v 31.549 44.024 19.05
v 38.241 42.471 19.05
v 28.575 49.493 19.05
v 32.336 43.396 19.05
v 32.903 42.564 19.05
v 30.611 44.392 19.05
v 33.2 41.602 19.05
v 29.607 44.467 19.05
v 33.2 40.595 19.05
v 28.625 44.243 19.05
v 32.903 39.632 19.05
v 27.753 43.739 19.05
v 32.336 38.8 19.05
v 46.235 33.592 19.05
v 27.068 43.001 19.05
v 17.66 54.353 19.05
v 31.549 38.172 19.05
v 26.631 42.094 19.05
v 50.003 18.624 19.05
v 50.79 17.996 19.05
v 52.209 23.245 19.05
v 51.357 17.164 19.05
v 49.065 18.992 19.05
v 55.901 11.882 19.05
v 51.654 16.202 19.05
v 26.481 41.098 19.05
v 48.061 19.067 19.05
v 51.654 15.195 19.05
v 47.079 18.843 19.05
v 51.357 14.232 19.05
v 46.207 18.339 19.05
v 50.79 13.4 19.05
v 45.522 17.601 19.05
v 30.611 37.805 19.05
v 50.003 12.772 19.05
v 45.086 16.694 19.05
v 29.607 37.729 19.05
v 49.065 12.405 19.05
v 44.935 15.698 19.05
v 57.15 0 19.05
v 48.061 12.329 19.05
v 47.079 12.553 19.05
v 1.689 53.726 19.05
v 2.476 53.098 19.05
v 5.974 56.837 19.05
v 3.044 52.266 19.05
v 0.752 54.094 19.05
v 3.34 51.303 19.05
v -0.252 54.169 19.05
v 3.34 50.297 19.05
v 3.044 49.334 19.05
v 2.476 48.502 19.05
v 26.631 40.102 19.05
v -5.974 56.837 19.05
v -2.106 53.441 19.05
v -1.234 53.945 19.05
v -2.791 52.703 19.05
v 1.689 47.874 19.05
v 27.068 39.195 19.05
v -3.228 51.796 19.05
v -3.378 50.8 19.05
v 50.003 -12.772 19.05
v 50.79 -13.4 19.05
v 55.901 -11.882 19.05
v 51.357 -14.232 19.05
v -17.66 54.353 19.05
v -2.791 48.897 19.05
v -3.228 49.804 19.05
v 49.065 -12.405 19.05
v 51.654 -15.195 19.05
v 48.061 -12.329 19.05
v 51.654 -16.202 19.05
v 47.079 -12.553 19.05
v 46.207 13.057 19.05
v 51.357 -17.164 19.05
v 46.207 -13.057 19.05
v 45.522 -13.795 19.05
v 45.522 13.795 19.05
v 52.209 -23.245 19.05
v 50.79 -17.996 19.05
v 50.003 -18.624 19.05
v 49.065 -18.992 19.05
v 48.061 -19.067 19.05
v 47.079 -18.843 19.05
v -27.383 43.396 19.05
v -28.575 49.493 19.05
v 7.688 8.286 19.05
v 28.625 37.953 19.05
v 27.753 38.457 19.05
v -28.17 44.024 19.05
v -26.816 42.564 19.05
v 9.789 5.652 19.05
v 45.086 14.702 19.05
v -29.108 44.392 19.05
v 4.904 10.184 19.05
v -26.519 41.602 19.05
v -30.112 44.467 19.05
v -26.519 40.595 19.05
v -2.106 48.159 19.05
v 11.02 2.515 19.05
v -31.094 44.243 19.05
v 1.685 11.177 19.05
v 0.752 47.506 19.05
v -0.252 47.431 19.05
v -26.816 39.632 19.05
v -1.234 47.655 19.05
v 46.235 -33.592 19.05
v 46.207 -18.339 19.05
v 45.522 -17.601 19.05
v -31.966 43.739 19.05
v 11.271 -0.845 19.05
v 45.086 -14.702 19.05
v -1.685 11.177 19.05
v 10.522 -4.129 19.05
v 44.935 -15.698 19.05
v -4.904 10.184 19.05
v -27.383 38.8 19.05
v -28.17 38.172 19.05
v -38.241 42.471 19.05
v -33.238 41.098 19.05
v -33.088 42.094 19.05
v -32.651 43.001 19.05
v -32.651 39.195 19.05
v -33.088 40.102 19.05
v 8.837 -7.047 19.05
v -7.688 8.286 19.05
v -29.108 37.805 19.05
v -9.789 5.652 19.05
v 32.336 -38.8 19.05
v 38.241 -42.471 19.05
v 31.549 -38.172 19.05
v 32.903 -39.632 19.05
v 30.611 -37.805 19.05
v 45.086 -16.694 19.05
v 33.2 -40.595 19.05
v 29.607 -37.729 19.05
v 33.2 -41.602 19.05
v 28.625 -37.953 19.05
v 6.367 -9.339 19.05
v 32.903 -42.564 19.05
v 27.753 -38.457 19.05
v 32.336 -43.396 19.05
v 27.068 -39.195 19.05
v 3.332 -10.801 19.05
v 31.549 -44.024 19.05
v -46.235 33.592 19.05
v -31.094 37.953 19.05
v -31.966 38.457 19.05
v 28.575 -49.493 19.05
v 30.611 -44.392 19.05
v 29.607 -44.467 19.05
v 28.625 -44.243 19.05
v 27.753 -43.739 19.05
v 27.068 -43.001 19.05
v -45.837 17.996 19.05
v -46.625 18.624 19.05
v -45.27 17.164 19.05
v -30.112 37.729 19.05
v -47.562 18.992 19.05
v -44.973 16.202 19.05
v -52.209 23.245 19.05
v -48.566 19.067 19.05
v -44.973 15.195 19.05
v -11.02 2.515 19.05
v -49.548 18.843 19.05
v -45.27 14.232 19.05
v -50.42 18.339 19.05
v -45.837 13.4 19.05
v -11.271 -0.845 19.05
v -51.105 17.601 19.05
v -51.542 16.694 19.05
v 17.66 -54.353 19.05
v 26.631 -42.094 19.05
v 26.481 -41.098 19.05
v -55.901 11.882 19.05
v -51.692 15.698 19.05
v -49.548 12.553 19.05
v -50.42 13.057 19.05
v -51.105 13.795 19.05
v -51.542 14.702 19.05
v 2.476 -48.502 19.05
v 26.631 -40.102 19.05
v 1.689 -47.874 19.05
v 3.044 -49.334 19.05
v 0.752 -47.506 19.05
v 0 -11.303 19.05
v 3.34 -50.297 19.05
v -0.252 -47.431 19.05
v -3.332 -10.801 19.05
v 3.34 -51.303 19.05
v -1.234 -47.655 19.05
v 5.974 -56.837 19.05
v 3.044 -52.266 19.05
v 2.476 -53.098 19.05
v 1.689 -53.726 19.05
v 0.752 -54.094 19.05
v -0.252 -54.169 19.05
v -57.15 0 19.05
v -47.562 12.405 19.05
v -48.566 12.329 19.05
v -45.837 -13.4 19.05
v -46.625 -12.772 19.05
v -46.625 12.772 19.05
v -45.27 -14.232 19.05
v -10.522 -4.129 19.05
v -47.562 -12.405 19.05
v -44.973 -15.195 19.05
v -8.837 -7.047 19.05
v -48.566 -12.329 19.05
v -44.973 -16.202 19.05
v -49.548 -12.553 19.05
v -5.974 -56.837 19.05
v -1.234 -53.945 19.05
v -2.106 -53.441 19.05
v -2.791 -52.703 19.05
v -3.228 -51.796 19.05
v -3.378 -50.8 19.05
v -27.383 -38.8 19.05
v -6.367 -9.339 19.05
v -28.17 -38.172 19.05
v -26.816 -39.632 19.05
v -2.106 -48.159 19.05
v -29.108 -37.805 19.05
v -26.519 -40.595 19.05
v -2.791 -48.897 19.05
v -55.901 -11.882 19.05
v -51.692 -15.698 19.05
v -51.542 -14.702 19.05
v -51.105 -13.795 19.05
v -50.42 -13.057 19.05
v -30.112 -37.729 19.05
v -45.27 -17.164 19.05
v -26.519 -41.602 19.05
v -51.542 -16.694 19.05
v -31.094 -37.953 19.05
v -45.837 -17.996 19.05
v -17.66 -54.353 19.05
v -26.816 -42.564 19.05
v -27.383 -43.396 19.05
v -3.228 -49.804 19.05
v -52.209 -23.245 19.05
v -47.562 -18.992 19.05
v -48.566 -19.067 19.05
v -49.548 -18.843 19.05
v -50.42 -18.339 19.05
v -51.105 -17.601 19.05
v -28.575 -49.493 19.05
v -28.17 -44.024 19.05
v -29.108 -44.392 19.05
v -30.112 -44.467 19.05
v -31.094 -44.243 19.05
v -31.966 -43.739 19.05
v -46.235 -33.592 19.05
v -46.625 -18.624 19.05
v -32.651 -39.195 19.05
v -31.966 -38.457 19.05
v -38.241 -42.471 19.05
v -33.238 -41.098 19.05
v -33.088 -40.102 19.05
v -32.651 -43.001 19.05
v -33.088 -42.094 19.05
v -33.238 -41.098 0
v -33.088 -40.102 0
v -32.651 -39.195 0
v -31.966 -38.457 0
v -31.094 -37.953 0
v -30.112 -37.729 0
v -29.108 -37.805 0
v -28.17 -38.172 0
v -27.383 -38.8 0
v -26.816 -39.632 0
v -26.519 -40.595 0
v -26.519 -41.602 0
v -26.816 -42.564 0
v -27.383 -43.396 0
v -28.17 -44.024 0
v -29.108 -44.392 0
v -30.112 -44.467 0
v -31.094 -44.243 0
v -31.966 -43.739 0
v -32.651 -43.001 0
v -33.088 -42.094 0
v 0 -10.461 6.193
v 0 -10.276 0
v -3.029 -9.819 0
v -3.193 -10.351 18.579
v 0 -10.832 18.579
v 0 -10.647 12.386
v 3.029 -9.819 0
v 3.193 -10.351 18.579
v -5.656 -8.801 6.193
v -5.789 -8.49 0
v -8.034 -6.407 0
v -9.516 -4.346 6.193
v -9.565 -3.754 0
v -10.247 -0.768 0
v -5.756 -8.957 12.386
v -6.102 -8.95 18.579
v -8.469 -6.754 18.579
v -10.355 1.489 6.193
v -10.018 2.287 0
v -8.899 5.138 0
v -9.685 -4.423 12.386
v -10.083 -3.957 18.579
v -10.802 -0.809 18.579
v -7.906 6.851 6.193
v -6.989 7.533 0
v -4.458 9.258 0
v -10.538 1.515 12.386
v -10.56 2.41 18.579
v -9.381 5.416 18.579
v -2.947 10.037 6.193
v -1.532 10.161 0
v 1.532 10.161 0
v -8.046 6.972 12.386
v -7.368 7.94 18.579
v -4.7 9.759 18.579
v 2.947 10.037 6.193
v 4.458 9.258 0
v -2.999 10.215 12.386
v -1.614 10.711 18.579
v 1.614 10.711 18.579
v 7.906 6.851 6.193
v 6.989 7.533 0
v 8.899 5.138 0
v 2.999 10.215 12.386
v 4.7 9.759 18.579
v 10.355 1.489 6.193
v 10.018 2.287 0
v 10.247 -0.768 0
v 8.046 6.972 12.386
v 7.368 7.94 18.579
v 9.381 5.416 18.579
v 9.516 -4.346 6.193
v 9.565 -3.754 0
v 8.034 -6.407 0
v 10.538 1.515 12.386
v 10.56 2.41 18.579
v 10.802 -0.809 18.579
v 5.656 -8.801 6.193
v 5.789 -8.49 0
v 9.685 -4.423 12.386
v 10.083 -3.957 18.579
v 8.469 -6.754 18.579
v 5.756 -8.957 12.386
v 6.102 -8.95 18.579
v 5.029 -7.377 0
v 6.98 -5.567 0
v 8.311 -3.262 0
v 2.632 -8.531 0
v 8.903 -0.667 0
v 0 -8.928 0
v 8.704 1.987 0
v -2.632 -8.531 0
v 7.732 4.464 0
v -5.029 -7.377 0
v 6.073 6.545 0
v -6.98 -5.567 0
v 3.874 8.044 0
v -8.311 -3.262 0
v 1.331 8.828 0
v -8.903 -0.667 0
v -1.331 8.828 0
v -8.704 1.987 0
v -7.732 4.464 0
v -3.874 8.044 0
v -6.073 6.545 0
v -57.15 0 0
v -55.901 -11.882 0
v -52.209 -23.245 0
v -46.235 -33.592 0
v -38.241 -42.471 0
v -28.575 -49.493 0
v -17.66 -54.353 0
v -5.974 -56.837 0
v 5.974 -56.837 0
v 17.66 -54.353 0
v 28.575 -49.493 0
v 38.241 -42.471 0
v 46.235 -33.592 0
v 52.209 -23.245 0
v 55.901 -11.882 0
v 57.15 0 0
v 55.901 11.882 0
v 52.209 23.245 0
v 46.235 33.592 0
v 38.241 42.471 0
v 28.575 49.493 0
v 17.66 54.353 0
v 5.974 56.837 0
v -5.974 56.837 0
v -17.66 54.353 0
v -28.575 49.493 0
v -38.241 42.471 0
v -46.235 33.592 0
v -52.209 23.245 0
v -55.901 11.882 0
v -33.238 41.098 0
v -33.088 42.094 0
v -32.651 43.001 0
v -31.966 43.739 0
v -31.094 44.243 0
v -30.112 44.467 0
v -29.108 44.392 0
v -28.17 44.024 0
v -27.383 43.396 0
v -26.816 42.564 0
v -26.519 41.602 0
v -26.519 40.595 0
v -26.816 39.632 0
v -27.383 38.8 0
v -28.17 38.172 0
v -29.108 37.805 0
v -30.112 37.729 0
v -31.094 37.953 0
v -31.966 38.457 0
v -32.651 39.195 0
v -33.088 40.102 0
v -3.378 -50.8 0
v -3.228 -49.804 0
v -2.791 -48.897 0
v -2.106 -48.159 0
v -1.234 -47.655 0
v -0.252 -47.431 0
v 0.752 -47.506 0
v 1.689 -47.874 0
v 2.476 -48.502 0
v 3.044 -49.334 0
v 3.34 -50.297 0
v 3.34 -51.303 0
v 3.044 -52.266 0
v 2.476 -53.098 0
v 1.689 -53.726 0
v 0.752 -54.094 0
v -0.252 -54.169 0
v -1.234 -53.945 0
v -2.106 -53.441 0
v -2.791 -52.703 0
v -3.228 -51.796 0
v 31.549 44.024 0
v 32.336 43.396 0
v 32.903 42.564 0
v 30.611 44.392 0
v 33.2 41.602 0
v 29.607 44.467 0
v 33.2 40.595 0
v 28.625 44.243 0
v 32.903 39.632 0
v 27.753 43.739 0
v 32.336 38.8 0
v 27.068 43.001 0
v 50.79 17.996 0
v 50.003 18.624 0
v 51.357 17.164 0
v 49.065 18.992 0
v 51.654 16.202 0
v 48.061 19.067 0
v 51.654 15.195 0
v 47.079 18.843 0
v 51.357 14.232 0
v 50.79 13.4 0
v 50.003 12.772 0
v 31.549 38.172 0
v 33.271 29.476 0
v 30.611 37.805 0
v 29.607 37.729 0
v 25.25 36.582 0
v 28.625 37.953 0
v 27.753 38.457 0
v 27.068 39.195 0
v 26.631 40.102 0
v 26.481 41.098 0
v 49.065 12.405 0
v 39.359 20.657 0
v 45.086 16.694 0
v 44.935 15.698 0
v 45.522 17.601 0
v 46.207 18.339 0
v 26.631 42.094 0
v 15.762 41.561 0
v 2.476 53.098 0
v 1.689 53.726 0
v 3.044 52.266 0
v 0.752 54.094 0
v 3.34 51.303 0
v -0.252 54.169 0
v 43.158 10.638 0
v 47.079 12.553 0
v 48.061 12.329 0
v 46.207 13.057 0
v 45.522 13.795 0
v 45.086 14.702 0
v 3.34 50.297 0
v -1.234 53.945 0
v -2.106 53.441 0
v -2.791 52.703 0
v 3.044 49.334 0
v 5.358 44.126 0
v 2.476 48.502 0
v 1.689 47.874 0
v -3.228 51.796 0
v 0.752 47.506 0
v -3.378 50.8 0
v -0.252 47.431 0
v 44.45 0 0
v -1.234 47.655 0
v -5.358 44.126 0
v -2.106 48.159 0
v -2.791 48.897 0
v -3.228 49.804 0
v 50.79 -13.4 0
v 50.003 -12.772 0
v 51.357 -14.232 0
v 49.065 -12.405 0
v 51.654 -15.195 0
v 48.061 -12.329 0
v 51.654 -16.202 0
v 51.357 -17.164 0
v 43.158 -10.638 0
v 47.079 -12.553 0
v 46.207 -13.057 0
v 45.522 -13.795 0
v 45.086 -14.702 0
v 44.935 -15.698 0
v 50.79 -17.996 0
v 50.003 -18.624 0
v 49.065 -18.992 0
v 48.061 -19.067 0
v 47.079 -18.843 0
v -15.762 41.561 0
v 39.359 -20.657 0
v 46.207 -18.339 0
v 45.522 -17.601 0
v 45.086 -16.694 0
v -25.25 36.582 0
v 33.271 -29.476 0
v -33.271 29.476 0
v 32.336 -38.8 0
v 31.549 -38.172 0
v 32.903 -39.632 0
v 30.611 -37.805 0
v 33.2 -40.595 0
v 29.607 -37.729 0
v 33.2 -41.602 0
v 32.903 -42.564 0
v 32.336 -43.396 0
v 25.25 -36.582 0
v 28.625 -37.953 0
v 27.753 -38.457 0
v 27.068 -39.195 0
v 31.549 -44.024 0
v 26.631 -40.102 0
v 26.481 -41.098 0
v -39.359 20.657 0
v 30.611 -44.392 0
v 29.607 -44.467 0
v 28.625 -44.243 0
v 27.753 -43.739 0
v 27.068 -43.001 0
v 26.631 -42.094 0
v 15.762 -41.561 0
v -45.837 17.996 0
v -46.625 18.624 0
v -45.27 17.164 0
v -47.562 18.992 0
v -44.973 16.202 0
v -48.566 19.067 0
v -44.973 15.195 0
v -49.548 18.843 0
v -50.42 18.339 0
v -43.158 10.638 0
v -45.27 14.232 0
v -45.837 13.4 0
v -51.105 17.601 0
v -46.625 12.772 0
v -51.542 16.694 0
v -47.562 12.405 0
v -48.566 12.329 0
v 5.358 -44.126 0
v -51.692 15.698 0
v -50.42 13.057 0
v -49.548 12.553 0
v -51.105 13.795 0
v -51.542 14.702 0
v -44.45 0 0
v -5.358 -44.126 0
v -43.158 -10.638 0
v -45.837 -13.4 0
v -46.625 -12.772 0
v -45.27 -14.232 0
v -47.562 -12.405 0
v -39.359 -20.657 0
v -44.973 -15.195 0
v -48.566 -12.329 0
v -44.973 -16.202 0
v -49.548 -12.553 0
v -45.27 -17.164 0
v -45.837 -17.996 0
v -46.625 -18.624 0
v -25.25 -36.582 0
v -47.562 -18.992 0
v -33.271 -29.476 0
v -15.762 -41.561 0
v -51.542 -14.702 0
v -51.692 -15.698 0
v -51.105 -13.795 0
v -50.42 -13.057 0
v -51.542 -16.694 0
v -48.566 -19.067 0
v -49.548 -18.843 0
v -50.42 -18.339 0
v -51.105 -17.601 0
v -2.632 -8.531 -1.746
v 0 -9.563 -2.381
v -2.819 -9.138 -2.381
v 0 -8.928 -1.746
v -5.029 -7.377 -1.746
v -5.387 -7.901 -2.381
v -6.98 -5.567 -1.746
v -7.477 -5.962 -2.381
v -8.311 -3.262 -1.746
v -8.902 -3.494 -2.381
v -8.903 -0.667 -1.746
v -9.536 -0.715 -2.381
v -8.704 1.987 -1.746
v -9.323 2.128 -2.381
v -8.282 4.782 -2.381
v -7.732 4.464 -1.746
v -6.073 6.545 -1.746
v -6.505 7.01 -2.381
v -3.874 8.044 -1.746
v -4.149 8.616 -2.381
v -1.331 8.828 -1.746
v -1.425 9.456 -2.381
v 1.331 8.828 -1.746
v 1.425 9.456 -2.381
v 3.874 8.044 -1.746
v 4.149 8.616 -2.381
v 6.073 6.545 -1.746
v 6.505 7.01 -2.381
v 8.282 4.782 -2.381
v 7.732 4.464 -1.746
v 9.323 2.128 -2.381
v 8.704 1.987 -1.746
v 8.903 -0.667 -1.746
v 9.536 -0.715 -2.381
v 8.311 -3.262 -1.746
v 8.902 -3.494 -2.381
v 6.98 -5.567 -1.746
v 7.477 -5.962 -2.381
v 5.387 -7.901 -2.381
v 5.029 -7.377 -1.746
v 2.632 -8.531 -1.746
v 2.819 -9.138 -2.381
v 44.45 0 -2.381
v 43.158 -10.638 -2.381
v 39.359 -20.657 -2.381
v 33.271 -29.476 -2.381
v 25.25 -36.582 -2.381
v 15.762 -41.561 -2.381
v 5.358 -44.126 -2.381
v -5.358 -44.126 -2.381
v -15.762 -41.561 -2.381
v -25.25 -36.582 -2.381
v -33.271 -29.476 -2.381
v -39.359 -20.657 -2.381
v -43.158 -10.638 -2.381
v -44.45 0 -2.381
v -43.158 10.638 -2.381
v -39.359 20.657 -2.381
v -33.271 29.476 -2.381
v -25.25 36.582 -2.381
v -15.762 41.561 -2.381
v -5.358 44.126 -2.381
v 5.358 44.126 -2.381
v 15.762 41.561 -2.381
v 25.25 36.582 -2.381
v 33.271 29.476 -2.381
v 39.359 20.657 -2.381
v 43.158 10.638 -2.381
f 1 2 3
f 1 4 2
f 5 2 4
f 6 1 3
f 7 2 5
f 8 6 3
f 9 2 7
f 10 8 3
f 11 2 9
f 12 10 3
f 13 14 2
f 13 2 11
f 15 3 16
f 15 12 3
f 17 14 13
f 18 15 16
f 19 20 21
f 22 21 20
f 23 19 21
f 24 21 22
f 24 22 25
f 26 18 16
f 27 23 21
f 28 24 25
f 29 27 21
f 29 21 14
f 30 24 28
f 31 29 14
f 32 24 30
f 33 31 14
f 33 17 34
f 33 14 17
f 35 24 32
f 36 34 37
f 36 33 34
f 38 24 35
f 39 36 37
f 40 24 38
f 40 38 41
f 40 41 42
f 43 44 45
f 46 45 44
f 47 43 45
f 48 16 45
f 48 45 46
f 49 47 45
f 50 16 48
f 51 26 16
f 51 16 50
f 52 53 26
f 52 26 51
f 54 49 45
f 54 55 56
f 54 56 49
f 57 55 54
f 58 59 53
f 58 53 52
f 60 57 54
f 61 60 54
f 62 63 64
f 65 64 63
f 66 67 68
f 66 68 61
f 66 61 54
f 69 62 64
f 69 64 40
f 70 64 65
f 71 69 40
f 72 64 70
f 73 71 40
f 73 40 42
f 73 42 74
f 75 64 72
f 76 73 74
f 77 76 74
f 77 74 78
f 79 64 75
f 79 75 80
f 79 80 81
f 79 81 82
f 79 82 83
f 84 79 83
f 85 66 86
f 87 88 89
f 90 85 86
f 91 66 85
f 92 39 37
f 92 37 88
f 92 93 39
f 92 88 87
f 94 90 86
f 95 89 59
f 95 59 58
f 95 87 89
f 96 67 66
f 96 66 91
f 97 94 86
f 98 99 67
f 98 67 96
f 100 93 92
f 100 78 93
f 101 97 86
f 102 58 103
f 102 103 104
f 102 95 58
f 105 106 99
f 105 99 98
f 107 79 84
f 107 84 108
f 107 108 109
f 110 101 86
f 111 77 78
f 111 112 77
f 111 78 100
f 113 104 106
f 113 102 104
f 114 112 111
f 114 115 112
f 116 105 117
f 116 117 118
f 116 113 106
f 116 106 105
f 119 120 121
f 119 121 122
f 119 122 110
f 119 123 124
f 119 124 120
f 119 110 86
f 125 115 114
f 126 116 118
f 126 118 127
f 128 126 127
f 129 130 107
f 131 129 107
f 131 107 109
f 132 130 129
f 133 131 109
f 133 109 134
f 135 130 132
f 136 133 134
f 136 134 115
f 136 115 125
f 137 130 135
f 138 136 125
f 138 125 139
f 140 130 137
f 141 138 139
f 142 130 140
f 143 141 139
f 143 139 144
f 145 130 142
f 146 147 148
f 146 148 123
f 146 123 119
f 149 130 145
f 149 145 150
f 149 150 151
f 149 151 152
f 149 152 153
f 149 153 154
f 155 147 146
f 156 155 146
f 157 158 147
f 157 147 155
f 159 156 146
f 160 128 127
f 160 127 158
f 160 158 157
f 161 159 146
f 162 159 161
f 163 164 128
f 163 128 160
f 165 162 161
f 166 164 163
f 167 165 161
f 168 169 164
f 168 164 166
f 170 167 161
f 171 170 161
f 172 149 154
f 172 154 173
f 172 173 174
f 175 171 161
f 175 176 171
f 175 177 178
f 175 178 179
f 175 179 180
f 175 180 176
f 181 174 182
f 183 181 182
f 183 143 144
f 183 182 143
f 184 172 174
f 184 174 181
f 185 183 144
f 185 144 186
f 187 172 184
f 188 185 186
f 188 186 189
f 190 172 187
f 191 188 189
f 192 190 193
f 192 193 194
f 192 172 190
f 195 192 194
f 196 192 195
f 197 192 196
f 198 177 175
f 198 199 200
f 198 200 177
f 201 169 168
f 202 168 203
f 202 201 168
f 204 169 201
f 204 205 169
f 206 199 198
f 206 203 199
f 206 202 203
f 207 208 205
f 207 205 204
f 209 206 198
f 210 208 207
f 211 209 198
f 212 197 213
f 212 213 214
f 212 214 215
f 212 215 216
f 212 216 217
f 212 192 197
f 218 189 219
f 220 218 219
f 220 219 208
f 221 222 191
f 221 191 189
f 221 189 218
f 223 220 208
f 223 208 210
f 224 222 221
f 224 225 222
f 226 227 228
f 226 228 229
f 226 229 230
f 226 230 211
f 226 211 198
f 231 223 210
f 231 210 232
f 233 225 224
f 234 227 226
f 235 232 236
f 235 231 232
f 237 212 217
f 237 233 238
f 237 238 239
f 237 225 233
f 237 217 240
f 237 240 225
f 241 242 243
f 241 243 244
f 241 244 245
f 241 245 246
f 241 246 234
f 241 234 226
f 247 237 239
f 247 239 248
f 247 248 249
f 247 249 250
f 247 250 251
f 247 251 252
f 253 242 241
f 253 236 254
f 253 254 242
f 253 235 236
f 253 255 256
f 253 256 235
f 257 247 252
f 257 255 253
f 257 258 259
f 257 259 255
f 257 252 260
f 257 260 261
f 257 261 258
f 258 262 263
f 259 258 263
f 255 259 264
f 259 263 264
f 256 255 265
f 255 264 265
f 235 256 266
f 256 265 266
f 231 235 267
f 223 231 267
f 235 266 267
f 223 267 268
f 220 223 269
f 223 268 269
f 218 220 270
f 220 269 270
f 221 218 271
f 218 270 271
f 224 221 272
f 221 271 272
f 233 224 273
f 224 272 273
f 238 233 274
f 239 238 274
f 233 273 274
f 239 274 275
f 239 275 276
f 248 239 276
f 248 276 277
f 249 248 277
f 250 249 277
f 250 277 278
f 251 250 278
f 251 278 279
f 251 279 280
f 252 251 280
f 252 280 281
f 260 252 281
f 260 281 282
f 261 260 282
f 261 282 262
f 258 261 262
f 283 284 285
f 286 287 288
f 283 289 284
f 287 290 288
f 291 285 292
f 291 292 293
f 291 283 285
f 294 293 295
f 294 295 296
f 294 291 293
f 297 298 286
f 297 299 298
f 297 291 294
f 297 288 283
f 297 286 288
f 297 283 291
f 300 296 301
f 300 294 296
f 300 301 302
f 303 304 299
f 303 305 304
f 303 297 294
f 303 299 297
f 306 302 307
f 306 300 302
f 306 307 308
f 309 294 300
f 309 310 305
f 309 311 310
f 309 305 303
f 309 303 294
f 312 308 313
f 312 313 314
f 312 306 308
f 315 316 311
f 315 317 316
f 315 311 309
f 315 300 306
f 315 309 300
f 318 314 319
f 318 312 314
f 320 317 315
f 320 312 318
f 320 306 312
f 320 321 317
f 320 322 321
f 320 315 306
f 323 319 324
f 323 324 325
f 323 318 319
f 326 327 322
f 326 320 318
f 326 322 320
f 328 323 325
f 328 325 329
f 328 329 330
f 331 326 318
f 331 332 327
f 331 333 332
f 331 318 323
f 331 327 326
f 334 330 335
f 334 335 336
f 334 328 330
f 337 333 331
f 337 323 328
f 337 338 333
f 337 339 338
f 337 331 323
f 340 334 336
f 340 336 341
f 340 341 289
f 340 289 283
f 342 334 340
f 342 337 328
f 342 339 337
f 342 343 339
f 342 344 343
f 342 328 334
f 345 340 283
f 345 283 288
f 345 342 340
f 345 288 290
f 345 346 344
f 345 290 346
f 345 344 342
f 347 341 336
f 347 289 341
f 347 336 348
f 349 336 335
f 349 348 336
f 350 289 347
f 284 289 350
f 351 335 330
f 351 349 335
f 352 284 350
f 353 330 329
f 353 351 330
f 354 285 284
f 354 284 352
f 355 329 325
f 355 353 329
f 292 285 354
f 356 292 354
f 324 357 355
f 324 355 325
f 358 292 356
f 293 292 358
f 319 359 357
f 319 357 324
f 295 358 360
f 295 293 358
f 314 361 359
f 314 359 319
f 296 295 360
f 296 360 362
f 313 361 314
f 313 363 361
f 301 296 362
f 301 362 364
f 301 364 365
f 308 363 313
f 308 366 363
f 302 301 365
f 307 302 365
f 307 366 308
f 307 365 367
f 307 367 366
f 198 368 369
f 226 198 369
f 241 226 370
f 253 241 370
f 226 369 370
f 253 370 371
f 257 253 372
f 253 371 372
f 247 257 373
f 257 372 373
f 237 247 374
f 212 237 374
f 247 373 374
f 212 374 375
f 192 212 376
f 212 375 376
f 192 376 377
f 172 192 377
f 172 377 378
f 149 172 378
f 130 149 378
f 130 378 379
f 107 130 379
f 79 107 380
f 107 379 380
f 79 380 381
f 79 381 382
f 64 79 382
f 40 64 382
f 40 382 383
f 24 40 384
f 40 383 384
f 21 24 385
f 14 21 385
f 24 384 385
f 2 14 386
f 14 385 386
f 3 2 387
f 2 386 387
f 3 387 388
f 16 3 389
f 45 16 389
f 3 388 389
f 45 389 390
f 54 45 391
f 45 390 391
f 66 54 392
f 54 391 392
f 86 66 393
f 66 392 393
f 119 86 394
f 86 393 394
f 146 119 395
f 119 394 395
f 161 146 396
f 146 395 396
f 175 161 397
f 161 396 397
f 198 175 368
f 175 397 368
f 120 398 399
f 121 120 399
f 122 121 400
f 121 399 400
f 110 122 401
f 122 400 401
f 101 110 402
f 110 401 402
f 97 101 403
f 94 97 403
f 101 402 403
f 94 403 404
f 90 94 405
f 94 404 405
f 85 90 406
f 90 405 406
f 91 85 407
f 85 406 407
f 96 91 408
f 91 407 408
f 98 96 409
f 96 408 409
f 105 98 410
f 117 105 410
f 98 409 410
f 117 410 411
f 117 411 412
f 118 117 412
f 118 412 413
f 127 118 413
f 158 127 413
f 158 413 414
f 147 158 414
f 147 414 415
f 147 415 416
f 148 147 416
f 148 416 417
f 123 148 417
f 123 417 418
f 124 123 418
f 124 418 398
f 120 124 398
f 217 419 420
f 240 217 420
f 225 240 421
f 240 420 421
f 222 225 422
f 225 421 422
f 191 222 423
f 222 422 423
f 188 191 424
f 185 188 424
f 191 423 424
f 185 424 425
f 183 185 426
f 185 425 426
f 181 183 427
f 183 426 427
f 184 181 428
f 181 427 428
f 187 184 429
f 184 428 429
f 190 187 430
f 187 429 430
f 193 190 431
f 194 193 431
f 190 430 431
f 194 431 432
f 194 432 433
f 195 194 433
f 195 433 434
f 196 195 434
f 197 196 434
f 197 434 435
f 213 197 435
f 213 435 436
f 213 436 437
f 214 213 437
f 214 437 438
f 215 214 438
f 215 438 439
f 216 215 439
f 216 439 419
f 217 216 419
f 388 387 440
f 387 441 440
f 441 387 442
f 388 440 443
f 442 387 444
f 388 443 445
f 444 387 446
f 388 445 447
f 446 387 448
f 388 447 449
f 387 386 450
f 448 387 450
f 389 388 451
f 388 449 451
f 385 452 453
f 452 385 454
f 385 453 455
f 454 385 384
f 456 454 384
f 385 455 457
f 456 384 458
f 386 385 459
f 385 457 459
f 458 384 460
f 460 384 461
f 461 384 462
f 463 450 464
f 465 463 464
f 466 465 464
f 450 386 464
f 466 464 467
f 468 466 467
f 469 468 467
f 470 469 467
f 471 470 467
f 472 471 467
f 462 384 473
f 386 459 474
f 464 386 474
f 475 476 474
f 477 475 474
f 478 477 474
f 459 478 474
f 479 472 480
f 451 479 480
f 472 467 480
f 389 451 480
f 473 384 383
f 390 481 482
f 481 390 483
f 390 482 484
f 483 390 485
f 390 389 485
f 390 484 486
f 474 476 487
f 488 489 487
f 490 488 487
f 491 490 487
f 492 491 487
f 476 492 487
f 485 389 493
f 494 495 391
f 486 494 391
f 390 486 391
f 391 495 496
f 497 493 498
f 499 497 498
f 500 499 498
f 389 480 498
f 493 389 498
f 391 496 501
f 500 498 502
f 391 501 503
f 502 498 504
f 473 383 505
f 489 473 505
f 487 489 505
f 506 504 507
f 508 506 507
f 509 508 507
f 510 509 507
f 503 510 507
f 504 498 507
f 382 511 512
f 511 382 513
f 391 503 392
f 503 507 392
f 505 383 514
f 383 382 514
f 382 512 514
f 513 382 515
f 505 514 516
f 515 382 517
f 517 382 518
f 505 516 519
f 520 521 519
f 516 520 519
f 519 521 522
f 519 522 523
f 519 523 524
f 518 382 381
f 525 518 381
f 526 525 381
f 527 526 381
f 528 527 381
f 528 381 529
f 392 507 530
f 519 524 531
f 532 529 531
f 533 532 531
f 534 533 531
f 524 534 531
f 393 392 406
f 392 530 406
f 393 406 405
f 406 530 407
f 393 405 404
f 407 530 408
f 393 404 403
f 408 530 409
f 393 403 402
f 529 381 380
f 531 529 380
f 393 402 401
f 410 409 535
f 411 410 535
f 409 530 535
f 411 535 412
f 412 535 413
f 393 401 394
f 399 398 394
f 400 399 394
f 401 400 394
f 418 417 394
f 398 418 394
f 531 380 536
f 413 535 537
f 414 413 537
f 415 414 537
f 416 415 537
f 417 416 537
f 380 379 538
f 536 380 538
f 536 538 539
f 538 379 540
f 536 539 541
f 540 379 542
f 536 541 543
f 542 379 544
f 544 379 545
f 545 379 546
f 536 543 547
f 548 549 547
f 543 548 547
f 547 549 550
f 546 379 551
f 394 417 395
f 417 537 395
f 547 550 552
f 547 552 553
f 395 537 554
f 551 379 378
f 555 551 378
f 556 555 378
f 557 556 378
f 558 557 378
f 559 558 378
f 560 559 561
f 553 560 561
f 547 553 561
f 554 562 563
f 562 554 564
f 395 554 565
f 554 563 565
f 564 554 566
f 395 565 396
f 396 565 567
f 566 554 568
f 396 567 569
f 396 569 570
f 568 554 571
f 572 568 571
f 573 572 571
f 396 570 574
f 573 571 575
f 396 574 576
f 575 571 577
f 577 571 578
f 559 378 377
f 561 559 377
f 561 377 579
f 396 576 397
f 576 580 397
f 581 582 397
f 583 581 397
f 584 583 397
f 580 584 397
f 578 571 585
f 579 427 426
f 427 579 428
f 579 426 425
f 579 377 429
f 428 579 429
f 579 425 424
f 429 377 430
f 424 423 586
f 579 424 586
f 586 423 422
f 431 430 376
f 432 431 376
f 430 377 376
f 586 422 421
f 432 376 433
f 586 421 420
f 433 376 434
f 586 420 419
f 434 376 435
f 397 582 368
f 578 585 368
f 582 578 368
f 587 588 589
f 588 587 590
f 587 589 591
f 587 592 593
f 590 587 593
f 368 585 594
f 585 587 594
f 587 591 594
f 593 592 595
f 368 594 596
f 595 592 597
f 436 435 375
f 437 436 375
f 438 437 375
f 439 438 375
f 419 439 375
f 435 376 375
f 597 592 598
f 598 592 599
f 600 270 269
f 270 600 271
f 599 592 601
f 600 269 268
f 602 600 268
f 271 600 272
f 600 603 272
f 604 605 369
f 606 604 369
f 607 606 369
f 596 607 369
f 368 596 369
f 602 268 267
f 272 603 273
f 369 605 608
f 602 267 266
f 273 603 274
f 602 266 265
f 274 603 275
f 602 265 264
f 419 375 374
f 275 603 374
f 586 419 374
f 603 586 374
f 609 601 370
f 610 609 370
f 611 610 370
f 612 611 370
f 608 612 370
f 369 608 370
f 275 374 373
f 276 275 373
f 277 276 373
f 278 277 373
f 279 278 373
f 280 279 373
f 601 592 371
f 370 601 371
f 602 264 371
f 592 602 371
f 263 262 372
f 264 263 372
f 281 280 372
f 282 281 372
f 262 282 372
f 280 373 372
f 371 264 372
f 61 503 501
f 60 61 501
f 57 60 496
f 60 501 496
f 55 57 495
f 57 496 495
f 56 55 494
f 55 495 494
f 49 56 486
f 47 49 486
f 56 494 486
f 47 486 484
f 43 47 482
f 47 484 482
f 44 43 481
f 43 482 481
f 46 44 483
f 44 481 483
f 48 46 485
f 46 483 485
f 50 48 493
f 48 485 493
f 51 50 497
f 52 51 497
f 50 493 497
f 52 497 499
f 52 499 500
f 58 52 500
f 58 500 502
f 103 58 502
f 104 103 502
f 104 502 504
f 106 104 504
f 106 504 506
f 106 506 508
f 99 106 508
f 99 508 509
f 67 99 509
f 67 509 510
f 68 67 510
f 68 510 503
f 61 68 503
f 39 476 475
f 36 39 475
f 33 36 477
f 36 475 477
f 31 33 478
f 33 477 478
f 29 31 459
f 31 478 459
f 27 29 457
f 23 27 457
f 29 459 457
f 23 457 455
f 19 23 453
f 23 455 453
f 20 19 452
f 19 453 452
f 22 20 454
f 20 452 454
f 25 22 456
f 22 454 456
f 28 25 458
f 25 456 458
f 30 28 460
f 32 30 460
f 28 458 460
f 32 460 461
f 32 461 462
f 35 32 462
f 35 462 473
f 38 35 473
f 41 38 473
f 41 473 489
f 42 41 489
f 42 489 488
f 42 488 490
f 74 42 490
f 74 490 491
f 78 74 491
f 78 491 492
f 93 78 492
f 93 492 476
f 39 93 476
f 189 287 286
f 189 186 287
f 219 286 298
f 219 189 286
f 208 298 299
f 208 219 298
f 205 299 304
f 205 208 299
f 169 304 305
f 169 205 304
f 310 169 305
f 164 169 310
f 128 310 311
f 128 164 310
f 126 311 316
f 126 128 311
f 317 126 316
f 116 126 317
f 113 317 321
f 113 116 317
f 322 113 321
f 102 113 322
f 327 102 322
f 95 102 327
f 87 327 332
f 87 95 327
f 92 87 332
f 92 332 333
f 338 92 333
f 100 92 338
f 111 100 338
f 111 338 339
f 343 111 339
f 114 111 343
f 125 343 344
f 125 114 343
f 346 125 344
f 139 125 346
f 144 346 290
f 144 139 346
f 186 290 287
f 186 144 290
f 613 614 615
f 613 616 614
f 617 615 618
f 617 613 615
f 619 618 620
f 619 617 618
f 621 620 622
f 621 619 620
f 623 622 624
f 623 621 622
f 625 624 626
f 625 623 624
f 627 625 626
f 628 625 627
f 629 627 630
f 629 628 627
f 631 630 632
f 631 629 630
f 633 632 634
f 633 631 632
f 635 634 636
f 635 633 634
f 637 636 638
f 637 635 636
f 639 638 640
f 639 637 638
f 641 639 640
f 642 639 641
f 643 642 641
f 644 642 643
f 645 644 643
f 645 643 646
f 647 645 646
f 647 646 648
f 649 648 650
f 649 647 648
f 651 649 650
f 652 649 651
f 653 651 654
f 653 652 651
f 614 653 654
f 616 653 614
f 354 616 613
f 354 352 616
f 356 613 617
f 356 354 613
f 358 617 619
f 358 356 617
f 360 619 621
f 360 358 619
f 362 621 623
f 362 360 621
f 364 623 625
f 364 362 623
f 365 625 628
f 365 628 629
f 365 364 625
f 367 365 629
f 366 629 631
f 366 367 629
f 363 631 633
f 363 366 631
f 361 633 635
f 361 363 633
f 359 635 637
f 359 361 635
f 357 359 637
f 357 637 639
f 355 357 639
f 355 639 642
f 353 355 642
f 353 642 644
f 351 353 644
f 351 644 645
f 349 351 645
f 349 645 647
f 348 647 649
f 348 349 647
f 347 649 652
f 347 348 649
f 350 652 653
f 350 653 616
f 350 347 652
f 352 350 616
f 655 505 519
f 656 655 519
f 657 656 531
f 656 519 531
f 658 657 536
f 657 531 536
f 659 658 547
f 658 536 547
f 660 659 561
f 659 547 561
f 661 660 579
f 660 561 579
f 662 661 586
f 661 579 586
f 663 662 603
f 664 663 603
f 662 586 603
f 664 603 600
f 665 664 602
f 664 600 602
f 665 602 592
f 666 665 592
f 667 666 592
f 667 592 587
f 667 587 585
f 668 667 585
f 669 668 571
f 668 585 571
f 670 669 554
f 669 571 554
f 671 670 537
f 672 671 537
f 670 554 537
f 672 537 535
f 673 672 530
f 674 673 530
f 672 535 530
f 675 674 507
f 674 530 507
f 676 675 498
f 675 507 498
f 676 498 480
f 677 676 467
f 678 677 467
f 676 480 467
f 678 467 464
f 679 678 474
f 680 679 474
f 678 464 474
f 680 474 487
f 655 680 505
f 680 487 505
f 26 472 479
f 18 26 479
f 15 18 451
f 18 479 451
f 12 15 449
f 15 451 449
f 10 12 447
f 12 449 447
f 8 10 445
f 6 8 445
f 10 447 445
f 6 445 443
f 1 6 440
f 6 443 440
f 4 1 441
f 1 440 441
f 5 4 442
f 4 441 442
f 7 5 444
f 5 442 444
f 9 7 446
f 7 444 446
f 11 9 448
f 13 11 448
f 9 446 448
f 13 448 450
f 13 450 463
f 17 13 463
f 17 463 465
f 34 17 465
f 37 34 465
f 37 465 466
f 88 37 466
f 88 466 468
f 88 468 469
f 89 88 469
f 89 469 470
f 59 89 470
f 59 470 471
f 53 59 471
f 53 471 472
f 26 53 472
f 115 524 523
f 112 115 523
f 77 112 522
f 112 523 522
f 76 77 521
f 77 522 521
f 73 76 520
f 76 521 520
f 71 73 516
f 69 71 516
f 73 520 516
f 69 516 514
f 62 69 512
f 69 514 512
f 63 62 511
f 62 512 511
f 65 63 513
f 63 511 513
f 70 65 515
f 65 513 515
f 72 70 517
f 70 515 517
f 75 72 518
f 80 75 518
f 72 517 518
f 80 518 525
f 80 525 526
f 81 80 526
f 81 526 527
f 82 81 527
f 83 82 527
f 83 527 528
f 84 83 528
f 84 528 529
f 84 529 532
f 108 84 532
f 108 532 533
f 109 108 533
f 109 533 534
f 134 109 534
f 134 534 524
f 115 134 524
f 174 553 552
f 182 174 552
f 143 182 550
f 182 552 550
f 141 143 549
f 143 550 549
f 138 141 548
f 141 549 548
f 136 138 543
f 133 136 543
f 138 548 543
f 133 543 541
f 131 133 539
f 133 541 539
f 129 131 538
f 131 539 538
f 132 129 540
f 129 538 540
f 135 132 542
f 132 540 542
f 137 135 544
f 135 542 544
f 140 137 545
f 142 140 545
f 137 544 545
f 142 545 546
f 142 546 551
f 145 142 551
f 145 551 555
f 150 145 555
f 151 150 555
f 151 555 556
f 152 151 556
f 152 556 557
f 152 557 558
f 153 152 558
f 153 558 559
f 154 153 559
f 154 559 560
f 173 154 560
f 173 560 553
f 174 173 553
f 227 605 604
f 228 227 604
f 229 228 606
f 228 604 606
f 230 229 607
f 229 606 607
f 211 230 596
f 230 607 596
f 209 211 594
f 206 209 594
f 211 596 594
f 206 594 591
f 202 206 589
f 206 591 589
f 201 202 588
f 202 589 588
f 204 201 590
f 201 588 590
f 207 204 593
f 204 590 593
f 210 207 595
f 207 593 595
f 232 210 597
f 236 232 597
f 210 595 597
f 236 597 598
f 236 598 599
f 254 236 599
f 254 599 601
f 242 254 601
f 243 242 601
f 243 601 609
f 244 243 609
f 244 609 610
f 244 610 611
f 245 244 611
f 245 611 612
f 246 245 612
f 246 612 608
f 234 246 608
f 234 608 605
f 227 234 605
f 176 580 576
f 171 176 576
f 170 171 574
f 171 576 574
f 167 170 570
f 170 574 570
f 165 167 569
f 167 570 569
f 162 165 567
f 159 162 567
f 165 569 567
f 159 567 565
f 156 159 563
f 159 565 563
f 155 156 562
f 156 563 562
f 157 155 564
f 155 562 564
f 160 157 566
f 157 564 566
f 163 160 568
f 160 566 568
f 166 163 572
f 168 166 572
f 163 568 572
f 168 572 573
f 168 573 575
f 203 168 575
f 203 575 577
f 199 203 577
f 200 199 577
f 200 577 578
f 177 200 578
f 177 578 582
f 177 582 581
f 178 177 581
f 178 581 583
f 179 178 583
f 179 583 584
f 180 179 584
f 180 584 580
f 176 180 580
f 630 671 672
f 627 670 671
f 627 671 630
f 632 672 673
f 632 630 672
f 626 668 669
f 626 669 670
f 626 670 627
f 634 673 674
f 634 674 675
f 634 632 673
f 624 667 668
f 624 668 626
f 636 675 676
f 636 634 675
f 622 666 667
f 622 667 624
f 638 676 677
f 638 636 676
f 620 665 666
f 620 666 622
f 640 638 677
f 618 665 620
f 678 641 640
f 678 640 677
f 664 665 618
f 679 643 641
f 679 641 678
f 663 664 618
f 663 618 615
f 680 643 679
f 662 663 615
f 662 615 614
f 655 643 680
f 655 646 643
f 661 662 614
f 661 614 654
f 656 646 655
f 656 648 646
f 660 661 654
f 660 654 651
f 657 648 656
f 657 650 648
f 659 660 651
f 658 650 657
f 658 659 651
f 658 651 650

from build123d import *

# Parameters (mm, degrees)
SKETCH1_R                   = 57.15
BOSS_EXTRUDE1_DEPTH         = 19.05
F_1_4_CLEARANCE_HOLE1_D     = 6.7564
F_1_4_CLEARANCE_HOLE1_DEPTH = 57.15
F_1_4_CLEARANCE_HOLE1_TIP   = 2.029827343
SKETCH9_R                   = 44.45
PIPE_ALIGNMENTSEAL_DEPTH    = 2.38125


with BuildPart() as part:
    # Sketch1 → Boss-Extrude1 (new body)
    with BuildSketch(Plane.XY):
        with Locations(Location((0, 0, 0), (0, 0, 180))):
            Circle(SKETCH1_R)
    extrude(amount=BOSS_EXTRUDE1_DEPTH)

    # 1/4 Clearance Hole1
    with Locations(Plane.XY.offset(19.05)):
        with Locations((0, 50.8), (29.859490816, 41.098063314), (48.313671028, 15.698063314), (48.313671028, -15.698063314), (29.859490816, -41.098063314), (0, -50.8), (-29.859490816, -41.098063314), (-48.313671028, -15.698063314), (-48.313671028, 15.698063314), (-29.859490816, 41.098063314)):
            Hole(F_1_4_CLEARANCE_HOLE1_D / 2, depth=F_1_4_CLEARANCE_HOLE1_DEPTH)
            with Locations((0, 0, -(F_1_4_CLEARANCE_HOLE1_DEPTH + F_1_4_CLEARANCE_HOLE1_TIP / 2))):  # 118° drill point
                Cone(0, F_1_4_CLEARANCE_HOLE1_D / 2, F_1_4_CLEARANCE_HOLE1_TIP, mode=Mode.SUBTRACT)

    # Sketch9 → Pipe AlignmentSeal (add)
    with BuildSketch(Plane(origin=(0, 0, 0), x_dir=(-1, 0, 0), z_dir=(0, 0, -1))):
        with Locations(Location((0, 0, 0), (0, 0, 180))):
            Circle(SKETCH9_R)
    extrude(amount=PIPE_ALIGNMENTSEAL_DEPTH)

    # Sketch14 → 1/2 NPT Tapped Hole6 (revolve, cut)
    with BuildSketch(Plane(origin=(0, 0, 19.05), x_dir=(0, -1, 0), z_dir=(1, 0, 0))):
        Polygon((0, 0), (0, 21.43125), (9.5631, 21.43125), (8.9281, 20.79625), (8.9281, 19.05), (10.275764385, 19.05), (10.8320459, 0.4709541), (11.303, 0), align=None)
    revolve(axis=Axis((0, 0, 25.4), (0, 0, -1)), mode=Mode.SUBTRACT)


solid = part.part
